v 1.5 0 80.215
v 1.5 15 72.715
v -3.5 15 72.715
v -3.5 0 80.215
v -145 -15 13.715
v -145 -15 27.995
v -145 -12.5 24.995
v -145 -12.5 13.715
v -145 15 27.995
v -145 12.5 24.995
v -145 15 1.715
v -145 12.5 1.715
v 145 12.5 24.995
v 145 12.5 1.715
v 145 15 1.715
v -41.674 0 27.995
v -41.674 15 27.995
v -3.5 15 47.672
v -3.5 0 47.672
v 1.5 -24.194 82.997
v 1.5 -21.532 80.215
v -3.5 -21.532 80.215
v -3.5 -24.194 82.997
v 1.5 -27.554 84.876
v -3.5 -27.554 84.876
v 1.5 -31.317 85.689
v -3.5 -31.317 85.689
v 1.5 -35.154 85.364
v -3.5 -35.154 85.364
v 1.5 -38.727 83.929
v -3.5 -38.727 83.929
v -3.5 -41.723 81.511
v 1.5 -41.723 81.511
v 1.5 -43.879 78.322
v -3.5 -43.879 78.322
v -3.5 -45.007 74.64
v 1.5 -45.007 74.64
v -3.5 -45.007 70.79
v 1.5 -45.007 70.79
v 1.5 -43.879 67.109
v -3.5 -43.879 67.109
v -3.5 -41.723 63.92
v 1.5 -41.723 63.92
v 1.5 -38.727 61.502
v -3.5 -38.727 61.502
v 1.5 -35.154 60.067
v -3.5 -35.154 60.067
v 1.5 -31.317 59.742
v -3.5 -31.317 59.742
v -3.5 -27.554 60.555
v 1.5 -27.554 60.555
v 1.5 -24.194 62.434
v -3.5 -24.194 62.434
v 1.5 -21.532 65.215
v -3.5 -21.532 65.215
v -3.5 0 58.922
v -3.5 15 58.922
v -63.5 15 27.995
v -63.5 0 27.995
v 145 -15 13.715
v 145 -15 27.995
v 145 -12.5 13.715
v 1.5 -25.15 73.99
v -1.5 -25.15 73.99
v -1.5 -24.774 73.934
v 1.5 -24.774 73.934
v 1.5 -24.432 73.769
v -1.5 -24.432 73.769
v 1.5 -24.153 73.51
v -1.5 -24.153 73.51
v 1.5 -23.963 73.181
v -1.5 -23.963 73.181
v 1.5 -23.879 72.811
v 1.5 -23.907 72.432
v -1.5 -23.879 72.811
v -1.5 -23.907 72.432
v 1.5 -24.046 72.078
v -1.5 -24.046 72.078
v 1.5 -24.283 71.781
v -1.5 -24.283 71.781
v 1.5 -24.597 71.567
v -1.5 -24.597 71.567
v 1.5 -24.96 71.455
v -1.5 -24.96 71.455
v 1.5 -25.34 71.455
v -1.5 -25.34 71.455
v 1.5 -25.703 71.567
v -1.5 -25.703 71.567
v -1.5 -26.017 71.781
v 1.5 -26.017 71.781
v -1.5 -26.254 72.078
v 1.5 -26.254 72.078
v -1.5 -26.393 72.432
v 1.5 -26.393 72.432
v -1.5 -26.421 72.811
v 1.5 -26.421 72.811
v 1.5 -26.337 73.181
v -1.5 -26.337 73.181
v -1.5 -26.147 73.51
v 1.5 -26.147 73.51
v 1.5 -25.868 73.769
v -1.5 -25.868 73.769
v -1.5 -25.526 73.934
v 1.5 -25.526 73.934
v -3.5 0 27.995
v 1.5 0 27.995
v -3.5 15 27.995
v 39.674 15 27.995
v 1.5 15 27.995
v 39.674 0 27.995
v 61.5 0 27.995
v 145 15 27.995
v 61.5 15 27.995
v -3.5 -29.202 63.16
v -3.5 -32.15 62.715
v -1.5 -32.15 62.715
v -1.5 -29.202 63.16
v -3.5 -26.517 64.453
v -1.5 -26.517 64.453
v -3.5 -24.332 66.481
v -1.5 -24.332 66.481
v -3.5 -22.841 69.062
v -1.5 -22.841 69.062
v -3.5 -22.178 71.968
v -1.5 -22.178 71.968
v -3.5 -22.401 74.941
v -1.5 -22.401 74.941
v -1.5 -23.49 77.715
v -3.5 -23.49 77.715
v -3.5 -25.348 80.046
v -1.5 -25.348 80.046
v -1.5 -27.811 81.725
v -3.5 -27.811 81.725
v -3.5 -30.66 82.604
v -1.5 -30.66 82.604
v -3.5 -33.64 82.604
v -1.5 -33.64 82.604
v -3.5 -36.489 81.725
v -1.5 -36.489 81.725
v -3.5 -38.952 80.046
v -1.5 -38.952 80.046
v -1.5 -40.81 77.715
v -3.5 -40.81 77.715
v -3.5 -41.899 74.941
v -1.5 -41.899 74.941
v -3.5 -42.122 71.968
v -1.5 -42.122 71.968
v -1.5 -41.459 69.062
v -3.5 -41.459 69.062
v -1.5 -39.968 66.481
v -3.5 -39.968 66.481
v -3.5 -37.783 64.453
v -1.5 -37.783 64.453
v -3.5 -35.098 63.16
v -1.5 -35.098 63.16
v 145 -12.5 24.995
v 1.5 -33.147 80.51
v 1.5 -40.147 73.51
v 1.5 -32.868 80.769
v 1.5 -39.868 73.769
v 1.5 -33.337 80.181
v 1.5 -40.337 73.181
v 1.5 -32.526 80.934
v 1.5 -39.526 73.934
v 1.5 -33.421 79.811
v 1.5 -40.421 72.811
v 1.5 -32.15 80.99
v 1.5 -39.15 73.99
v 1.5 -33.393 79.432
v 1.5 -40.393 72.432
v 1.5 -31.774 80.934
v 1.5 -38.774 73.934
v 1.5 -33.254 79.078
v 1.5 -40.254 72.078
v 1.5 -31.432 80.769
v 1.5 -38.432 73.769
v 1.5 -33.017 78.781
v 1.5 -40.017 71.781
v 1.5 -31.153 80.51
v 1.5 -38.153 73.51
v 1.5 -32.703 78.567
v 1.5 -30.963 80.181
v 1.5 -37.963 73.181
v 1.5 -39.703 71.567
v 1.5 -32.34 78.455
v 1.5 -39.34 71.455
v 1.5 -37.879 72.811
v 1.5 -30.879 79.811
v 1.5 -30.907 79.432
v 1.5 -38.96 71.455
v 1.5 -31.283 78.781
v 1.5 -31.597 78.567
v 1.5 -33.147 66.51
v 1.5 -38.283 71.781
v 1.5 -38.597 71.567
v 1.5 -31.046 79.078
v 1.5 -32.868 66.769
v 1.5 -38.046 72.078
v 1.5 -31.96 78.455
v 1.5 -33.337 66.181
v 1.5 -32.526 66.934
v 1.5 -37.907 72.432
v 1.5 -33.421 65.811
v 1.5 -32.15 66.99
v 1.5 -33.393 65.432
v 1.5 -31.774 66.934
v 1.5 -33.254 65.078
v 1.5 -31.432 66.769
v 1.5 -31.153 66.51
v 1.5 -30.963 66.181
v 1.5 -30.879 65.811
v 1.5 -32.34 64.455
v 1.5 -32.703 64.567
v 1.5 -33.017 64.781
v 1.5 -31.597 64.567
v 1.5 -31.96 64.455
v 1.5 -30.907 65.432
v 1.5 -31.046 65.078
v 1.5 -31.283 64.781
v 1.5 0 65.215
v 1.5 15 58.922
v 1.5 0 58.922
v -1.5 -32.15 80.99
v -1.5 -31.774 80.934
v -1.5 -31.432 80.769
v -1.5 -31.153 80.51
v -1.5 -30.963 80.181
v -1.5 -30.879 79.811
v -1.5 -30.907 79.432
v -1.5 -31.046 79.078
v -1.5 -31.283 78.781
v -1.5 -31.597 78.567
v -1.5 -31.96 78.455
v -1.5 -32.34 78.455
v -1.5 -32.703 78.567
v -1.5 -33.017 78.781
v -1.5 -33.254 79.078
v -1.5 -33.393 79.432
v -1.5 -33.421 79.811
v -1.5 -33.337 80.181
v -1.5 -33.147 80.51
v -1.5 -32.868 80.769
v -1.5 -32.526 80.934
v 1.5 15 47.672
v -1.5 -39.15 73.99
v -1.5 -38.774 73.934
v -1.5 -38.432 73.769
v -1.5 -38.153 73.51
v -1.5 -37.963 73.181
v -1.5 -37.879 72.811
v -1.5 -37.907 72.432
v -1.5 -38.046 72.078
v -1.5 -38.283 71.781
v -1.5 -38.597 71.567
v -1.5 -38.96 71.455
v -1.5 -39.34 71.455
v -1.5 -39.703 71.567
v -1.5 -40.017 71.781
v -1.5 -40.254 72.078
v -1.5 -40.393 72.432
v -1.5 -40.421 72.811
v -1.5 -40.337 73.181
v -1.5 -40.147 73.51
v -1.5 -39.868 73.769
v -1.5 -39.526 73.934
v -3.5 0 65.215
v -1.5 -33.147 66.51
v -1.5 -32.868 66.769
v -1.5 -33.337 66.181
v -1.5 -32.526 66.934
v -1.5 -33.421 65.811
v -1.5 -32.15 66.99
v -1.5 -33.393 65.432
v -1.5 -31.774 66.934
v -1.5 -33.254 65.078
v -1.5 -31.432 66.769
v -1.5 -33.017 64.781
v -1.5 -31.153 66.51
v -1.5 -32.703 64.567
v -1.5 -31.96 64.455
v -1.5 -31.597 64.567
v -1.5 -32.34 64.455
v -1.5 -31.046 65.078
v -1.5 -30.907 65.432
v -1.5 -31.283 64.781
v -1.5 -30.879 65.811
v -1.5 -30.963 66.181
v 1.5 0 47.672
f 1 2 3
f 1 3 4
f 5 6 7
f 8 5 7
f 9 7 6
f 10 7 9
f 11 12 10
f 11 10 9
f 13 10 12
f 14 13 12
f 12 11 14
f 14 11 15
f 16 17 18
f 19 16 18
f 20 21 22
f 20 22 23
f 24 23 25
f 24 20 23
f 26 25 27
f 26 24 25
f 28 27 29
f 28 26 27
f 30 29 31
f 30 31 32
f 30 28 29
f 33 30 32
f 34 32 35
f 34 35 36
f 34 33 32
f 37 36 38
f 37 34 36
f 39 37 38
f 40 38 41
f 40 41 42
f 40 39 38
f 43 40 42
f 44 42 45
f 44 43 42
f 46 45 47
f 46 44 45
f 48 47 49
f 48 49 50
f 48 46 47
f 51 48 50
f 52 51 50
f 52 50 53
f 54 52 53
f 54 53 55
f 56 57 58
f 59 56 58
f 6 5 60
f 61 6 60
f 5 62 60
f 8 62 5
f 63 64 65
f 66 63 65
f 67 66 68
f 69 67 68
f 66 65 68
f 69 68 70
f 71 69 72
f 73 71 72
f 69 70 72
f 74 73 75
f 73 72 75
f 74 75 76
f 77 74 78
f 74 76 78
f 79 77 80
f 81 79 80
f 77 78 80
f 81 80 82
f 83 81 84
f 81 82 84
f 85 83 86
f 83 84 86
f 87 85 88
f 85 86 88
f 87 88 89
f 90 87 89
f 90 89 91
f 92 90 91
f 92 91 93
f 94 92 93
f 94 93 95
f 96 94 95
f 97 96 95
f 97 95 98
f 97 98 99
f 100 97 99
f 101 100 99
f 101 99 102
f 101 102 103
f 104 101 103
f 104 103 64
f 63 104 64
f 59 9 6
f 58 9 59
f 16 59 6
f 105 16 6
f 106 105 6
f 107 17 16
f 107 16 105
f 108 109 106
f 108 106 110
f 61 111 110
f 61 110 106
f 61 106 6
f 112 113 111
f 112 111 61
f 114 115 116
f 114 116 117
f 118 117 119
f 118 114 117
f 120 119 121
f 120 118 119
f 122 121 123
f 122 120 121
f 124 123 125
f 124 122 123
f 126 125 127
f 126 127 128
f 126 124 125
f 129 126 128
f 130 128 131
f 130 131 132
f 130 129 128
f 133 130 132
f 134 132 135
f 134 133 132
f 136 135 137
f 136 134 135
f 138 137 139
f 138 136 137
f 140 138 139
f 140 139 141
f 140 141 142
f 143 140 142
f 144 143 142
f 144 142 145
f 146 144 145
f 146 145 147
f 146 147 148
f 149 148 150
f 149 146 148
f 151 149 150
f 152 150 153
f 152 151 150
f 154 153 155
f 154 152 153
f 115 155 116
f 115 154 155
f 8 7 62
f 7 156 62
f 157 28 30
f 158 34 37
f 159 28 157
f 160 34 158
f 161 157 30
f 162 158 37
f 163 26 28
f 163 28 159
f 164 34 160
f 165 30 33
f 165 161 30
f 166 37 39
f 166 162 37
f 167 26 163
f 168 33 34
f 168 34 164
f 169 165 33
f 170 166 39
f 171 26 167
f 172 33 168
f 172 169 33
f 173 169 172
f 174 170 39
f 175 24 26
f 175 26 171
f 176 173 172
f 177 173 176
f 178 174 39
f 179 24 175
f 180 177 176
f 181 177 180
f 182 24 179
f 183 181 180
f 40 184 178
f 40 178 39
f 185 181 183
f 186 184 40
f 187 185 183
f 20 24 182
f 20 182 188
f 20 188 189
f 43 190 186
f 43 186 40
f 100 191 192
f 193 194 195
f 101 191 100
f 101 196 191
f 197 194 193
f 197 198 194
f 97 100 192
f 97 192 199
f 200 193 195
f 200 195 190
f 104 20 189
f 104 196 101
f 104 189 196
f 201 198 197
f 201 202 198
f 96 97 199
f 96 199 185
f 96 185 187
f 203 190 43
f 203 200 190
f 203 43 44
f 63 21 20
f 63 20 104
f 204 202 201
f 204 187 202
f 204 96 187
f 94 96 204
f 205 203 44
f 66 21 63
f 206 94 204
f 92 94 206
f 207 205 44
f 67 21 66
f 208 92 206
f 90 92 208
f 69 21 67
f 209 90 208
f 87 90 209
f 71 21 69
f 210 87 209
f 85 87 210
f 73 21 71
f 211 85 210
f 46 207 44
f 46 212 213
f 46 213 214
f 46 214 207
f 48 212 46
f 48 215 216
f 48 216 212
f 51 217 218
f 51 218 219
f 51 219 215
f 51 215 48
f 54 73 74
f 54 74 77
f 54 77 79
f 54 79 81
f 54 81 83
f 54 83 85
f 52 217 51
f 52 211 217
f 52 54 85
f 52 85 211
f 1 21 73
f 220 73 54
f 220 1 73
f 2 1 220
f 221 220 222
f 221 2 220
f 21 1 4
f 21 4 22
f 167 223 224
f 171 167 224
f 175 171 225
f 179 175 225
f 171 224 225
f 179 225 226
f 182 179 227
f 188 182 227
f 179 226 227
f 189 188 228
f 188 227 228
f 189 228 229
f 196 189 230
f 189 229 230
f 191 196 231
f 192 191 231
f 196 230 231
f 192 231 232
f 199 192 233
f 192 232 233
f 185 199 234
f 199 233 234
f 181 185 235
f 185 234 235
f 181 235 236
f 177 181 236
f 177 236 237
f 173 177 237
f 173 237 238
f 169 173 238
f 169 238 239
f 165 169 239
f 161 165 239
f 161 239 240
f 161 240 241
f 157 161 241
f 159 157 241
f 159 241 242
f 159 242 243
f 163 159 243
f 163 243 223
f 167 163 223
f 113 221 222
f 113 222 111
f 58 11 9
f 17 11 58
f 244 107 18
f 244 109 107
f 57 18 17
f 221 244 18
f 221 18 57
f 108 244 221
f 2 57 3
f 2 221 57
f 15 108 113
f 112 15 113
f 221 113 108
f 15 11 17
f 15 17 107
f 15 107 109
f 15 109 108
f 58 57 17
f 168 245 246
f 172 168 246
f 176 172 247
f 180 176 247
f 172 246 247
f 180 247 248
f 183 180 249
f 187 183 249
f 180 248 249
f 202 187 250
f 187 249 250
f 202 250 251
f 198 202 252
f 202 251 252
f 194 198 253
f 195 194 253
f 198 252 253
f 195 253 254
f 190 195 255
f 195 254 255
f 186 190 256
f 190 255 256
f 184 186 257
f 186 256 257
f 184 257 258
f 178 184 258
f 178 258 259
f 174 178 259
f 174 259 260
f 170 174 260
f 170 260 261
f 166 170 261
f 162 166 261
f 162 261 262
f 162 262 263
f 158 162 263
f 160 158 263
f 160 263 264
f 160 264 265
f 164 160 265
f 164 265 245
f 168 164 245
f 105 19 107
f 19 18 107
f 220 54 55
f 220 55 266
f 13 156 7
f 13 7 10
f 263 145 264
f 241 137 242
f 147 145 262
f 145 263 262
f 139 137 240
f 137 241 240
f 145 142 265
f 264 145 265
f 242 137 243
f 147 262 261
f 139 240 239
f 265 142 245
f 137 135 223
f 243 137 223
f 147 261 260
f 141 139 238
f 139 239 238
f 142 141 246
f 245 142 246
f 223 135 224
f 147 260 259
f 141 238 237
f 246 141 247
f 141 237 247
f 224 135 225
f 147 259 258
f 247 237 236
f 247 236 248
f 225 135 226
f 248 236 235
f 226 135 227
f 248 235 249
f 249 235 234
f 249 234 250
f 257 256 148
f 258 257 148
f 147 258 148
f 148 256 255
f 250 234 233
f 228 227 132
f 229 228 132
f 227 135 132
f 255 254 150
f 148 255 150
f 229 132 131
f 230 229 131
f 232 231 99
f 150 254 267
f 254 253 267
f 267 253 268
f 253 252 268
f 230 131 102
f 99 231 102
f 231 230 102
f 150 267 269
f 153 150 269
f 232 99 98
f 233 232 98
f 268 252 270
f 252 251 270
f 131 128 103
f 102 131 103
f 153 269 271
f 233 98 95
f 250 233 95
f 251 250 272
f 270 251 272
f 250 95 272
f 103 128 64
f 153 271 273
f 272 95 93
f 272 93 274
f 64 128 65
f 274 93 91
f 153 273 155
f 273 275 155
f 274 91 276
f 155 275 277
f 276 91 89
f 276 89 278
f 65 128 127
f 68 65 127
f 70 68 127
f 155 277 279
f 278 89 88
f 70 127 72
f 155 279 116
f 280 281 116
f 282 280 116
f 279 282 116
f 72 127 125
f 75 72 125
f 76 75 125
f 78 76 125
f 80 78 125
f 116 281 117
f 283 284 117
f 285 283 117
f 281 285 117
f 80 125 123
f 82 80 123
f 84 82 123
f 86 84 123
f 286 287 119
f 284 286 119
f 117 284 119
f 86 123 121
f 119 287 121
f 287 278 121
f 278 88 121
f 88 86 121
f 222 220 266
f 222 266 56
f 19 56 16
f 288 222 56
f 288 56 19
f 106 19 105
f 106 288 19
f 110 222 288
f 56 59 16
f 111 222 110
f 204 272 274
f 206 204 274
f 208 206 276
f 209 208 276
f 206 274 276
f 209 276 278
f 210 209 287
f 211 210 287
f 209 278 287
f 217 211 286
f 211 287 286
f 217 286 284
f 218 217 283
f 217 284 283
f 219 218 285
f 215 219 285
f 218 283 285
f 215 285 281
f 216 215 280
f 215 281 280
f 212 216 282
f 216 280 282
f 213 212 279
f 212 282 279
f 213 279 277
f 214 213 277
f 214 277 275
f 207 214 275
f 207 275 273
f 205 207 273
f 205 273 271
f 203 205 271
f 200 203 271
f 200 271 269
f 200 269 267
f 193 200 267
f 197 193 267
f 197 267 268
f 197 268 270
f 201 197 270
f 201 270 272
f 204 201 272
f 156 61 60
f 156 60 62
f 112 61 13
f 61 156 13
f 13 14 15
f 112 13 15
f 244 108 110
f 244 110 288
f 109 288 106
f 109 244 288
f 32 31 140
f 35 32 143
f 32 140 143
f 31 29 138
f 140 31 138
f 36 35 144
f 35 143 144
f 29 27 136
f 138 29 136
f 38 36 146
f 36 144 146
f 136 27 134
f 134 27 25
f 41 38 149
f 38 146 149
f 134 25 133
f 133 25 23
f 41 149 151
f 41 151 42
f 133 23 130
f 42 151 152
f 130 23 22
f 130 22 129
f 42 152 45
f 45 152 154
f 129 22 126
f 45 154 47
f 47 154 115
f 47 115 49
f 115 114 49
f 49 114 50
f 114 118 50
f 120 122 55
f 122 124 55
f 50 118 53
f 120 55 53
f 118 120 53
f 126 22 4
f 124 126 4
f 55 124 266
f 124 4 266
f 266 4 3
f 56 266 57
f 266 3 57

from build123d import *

# Parameters (mm, degrees)
SKETCH2_W                = 290
SKETCH2_H                = 30
SKETCH2_W_2              = 280
SKETCH2_H_2              = 25
BOSS_EXTRUDE1_DEPTH      = 23.28
SKETCH3_W                = 290
SKETCH3_H                = 30
BOSS_EXTRUDE2_DEPTH      = 3
SKETCH4_W                = 23.28
SKETCH4_H                = 25
CUT_EXTRUDE1_DEPTH       = 1
CUT_EXTRUDE1_DEPTH_BACK  = 291
BOSS_EXTRUDE3_DEPTH      = 2
BOSS_EXTRUDE3_DEPTH_BACK = 3
SKETCH6_R                = 10
CUT_EXTRUDE2_DEPTH       = 2
SKETCH7_R                = 1.275
CUT_EXTRUDE3_DEPTH       = 10
SKETCH8_W                = 290
SKETCH8_H                = 2.5
CUT_EXTRUDE4_DEPTH       = 12
BOSS_EXTRUDE4_DEPTH      = 15


with BuildPart() as part:
    # Sketch2 → Boss-Extrude1 (new body)
    with BuildSketch(Plane.XY.offset(1.715456747)):
        Rectangle(SKETCH2_W, SKETCH2_H)
        Rectangle(SKETCH2_W_2, SKETCH2_H_2, mode=Mode.SUBTRACT)
    extrude(amount=BOSS_EXTRUDE1_DEPTH)

    # Sketch3 → Boss-Extrude2 (add)
    with BuildSketch(Plane.XY.offset(24.995456747)):
        Rectangle(SKETCH3_W, SKETCH3_H)
    extrude(amount=BOSS_EXTRUDE2_DEPTH)

    # Sketch4 → Cut-Extrude1 (cut, two sides)
    with BuildSketch(Plane(origin=(145, 0, 0), x_dir=(0, 0, -1), z_dir=(1, 0, 0))) as cut_extrude1_sk:
        with Locations((-13.355456747, 0)):
            Rectangle(SKETCH4_W, SKETCH4_H)
    extrude(amount=CUT_EXTRUDE1_DEPTH, mode=Mode.SUBTRACT)
    extrude(cut_extrude1_sk.sketch, amount=-CUT_EXTRUDE1_DEPTH_BACK, mode=Mode.SUBTRACT)

    # Sketch5 → Boss-Extrude3 (add, two sides)
    with BuildSketch(Plane(origin=(-0.5, 0, 0), x_dir=(0, 0, -1), z_dir=(1, 0, 0))) as boss_extrude3_sk:
        with BuildLine():
            Line((-27.995456747, 0), (-27.995456747, 15))
            Line((-27.995456747, 15), (-72.715456747, 15))
            Line((-72.715456747, 15), (-80.215456747, 0))
            Line((-80.215456747, 0), (-80.215456747, -21.531619709))
            ThreePointArc((-80.215456747, -21.531619709), (-72.715456747, -45.15), (-65.215456747, -21.531619709))
            Line((-65.215456747, -21.531619709), (-65.215456747, 0))
            Line((-65.215456747, 0), (-27.995456747, 0))
        make_face()
    extrude(amount=BOSS_EXTRUDE3_DEPTH)
    extrude(boss_extrude3_sk.sketch, amount=-BOSS_EXTRUDE3_DEPTH_BACK)

    # Sketch6 → Cut-Extrude2 (cut)
    with BuildSketch(Plane(origin=(-3.5, 0, 0), x_dir=(0, 0, -1), z_dir=(1, 0, 0))):
        with Locations((-72.715456747, -32.15)):
            Circle(SKETCH6_R)
    extrude(amount=CUT_EXTRUDE2_DEPTH, mode=Mode.SUBTRACT)

    # Sketch7 → Cut-Extrude3 (cut)
    with BuildSketch(Plane.ZY.offset(3.5)):
        with Locations((72.715456747, -25.15)):
            Circle(SKETCH7_R)
        with Locations((79.715456747, -32.15)):
            Circle(SKETCH7_R)
        with Locations((72.715456747, -39.15)):
            Circle(SKETCH7_R)
        with Locations((65.715456747, -32.15)):
            Circle(SKETCH7_R)
    extrude(amount=-CUT_EXTRUDE3_DEPTH, mode=Mode.SUBTRACT)

    # Sketch8 → Cut-Extrude4 (cut)
    with BuildSketch(Plane(origin=(0, 0, 1.715456747), x_dir=(-1, 0, 0), z_dir=(0, 0, -1))):
        with Locations((0, -13.75)):
            Rectangle(SKETCH8_W, SKETCH8_H)
    extrude(amount=-CUT_EXTRUDE4_DEPTH, mode=Mode.SUBTRACT)

    # Sketch9 → Boss-Extrude4 (add)
    with BuildSketch(Plane(origin=(0, 15, 0), x_dir=(1, 0, 0), z_dir=(0, 1, 0))):
        Polygon((-3.5, -58.92224084), (-63.5, -27.995456747), (-41.673741056, -27.995456747), (-3.5, -47.671974209), align=None)
        Polygon((61.5, -27.995456747), (39.673741056, -27.995456747), (1.5, -47.671974209), (1.5, -58.92224084), align=None)
    extrude(amount=-BOSS_EXTRUDE4_DEPTH)


solid = part.part
